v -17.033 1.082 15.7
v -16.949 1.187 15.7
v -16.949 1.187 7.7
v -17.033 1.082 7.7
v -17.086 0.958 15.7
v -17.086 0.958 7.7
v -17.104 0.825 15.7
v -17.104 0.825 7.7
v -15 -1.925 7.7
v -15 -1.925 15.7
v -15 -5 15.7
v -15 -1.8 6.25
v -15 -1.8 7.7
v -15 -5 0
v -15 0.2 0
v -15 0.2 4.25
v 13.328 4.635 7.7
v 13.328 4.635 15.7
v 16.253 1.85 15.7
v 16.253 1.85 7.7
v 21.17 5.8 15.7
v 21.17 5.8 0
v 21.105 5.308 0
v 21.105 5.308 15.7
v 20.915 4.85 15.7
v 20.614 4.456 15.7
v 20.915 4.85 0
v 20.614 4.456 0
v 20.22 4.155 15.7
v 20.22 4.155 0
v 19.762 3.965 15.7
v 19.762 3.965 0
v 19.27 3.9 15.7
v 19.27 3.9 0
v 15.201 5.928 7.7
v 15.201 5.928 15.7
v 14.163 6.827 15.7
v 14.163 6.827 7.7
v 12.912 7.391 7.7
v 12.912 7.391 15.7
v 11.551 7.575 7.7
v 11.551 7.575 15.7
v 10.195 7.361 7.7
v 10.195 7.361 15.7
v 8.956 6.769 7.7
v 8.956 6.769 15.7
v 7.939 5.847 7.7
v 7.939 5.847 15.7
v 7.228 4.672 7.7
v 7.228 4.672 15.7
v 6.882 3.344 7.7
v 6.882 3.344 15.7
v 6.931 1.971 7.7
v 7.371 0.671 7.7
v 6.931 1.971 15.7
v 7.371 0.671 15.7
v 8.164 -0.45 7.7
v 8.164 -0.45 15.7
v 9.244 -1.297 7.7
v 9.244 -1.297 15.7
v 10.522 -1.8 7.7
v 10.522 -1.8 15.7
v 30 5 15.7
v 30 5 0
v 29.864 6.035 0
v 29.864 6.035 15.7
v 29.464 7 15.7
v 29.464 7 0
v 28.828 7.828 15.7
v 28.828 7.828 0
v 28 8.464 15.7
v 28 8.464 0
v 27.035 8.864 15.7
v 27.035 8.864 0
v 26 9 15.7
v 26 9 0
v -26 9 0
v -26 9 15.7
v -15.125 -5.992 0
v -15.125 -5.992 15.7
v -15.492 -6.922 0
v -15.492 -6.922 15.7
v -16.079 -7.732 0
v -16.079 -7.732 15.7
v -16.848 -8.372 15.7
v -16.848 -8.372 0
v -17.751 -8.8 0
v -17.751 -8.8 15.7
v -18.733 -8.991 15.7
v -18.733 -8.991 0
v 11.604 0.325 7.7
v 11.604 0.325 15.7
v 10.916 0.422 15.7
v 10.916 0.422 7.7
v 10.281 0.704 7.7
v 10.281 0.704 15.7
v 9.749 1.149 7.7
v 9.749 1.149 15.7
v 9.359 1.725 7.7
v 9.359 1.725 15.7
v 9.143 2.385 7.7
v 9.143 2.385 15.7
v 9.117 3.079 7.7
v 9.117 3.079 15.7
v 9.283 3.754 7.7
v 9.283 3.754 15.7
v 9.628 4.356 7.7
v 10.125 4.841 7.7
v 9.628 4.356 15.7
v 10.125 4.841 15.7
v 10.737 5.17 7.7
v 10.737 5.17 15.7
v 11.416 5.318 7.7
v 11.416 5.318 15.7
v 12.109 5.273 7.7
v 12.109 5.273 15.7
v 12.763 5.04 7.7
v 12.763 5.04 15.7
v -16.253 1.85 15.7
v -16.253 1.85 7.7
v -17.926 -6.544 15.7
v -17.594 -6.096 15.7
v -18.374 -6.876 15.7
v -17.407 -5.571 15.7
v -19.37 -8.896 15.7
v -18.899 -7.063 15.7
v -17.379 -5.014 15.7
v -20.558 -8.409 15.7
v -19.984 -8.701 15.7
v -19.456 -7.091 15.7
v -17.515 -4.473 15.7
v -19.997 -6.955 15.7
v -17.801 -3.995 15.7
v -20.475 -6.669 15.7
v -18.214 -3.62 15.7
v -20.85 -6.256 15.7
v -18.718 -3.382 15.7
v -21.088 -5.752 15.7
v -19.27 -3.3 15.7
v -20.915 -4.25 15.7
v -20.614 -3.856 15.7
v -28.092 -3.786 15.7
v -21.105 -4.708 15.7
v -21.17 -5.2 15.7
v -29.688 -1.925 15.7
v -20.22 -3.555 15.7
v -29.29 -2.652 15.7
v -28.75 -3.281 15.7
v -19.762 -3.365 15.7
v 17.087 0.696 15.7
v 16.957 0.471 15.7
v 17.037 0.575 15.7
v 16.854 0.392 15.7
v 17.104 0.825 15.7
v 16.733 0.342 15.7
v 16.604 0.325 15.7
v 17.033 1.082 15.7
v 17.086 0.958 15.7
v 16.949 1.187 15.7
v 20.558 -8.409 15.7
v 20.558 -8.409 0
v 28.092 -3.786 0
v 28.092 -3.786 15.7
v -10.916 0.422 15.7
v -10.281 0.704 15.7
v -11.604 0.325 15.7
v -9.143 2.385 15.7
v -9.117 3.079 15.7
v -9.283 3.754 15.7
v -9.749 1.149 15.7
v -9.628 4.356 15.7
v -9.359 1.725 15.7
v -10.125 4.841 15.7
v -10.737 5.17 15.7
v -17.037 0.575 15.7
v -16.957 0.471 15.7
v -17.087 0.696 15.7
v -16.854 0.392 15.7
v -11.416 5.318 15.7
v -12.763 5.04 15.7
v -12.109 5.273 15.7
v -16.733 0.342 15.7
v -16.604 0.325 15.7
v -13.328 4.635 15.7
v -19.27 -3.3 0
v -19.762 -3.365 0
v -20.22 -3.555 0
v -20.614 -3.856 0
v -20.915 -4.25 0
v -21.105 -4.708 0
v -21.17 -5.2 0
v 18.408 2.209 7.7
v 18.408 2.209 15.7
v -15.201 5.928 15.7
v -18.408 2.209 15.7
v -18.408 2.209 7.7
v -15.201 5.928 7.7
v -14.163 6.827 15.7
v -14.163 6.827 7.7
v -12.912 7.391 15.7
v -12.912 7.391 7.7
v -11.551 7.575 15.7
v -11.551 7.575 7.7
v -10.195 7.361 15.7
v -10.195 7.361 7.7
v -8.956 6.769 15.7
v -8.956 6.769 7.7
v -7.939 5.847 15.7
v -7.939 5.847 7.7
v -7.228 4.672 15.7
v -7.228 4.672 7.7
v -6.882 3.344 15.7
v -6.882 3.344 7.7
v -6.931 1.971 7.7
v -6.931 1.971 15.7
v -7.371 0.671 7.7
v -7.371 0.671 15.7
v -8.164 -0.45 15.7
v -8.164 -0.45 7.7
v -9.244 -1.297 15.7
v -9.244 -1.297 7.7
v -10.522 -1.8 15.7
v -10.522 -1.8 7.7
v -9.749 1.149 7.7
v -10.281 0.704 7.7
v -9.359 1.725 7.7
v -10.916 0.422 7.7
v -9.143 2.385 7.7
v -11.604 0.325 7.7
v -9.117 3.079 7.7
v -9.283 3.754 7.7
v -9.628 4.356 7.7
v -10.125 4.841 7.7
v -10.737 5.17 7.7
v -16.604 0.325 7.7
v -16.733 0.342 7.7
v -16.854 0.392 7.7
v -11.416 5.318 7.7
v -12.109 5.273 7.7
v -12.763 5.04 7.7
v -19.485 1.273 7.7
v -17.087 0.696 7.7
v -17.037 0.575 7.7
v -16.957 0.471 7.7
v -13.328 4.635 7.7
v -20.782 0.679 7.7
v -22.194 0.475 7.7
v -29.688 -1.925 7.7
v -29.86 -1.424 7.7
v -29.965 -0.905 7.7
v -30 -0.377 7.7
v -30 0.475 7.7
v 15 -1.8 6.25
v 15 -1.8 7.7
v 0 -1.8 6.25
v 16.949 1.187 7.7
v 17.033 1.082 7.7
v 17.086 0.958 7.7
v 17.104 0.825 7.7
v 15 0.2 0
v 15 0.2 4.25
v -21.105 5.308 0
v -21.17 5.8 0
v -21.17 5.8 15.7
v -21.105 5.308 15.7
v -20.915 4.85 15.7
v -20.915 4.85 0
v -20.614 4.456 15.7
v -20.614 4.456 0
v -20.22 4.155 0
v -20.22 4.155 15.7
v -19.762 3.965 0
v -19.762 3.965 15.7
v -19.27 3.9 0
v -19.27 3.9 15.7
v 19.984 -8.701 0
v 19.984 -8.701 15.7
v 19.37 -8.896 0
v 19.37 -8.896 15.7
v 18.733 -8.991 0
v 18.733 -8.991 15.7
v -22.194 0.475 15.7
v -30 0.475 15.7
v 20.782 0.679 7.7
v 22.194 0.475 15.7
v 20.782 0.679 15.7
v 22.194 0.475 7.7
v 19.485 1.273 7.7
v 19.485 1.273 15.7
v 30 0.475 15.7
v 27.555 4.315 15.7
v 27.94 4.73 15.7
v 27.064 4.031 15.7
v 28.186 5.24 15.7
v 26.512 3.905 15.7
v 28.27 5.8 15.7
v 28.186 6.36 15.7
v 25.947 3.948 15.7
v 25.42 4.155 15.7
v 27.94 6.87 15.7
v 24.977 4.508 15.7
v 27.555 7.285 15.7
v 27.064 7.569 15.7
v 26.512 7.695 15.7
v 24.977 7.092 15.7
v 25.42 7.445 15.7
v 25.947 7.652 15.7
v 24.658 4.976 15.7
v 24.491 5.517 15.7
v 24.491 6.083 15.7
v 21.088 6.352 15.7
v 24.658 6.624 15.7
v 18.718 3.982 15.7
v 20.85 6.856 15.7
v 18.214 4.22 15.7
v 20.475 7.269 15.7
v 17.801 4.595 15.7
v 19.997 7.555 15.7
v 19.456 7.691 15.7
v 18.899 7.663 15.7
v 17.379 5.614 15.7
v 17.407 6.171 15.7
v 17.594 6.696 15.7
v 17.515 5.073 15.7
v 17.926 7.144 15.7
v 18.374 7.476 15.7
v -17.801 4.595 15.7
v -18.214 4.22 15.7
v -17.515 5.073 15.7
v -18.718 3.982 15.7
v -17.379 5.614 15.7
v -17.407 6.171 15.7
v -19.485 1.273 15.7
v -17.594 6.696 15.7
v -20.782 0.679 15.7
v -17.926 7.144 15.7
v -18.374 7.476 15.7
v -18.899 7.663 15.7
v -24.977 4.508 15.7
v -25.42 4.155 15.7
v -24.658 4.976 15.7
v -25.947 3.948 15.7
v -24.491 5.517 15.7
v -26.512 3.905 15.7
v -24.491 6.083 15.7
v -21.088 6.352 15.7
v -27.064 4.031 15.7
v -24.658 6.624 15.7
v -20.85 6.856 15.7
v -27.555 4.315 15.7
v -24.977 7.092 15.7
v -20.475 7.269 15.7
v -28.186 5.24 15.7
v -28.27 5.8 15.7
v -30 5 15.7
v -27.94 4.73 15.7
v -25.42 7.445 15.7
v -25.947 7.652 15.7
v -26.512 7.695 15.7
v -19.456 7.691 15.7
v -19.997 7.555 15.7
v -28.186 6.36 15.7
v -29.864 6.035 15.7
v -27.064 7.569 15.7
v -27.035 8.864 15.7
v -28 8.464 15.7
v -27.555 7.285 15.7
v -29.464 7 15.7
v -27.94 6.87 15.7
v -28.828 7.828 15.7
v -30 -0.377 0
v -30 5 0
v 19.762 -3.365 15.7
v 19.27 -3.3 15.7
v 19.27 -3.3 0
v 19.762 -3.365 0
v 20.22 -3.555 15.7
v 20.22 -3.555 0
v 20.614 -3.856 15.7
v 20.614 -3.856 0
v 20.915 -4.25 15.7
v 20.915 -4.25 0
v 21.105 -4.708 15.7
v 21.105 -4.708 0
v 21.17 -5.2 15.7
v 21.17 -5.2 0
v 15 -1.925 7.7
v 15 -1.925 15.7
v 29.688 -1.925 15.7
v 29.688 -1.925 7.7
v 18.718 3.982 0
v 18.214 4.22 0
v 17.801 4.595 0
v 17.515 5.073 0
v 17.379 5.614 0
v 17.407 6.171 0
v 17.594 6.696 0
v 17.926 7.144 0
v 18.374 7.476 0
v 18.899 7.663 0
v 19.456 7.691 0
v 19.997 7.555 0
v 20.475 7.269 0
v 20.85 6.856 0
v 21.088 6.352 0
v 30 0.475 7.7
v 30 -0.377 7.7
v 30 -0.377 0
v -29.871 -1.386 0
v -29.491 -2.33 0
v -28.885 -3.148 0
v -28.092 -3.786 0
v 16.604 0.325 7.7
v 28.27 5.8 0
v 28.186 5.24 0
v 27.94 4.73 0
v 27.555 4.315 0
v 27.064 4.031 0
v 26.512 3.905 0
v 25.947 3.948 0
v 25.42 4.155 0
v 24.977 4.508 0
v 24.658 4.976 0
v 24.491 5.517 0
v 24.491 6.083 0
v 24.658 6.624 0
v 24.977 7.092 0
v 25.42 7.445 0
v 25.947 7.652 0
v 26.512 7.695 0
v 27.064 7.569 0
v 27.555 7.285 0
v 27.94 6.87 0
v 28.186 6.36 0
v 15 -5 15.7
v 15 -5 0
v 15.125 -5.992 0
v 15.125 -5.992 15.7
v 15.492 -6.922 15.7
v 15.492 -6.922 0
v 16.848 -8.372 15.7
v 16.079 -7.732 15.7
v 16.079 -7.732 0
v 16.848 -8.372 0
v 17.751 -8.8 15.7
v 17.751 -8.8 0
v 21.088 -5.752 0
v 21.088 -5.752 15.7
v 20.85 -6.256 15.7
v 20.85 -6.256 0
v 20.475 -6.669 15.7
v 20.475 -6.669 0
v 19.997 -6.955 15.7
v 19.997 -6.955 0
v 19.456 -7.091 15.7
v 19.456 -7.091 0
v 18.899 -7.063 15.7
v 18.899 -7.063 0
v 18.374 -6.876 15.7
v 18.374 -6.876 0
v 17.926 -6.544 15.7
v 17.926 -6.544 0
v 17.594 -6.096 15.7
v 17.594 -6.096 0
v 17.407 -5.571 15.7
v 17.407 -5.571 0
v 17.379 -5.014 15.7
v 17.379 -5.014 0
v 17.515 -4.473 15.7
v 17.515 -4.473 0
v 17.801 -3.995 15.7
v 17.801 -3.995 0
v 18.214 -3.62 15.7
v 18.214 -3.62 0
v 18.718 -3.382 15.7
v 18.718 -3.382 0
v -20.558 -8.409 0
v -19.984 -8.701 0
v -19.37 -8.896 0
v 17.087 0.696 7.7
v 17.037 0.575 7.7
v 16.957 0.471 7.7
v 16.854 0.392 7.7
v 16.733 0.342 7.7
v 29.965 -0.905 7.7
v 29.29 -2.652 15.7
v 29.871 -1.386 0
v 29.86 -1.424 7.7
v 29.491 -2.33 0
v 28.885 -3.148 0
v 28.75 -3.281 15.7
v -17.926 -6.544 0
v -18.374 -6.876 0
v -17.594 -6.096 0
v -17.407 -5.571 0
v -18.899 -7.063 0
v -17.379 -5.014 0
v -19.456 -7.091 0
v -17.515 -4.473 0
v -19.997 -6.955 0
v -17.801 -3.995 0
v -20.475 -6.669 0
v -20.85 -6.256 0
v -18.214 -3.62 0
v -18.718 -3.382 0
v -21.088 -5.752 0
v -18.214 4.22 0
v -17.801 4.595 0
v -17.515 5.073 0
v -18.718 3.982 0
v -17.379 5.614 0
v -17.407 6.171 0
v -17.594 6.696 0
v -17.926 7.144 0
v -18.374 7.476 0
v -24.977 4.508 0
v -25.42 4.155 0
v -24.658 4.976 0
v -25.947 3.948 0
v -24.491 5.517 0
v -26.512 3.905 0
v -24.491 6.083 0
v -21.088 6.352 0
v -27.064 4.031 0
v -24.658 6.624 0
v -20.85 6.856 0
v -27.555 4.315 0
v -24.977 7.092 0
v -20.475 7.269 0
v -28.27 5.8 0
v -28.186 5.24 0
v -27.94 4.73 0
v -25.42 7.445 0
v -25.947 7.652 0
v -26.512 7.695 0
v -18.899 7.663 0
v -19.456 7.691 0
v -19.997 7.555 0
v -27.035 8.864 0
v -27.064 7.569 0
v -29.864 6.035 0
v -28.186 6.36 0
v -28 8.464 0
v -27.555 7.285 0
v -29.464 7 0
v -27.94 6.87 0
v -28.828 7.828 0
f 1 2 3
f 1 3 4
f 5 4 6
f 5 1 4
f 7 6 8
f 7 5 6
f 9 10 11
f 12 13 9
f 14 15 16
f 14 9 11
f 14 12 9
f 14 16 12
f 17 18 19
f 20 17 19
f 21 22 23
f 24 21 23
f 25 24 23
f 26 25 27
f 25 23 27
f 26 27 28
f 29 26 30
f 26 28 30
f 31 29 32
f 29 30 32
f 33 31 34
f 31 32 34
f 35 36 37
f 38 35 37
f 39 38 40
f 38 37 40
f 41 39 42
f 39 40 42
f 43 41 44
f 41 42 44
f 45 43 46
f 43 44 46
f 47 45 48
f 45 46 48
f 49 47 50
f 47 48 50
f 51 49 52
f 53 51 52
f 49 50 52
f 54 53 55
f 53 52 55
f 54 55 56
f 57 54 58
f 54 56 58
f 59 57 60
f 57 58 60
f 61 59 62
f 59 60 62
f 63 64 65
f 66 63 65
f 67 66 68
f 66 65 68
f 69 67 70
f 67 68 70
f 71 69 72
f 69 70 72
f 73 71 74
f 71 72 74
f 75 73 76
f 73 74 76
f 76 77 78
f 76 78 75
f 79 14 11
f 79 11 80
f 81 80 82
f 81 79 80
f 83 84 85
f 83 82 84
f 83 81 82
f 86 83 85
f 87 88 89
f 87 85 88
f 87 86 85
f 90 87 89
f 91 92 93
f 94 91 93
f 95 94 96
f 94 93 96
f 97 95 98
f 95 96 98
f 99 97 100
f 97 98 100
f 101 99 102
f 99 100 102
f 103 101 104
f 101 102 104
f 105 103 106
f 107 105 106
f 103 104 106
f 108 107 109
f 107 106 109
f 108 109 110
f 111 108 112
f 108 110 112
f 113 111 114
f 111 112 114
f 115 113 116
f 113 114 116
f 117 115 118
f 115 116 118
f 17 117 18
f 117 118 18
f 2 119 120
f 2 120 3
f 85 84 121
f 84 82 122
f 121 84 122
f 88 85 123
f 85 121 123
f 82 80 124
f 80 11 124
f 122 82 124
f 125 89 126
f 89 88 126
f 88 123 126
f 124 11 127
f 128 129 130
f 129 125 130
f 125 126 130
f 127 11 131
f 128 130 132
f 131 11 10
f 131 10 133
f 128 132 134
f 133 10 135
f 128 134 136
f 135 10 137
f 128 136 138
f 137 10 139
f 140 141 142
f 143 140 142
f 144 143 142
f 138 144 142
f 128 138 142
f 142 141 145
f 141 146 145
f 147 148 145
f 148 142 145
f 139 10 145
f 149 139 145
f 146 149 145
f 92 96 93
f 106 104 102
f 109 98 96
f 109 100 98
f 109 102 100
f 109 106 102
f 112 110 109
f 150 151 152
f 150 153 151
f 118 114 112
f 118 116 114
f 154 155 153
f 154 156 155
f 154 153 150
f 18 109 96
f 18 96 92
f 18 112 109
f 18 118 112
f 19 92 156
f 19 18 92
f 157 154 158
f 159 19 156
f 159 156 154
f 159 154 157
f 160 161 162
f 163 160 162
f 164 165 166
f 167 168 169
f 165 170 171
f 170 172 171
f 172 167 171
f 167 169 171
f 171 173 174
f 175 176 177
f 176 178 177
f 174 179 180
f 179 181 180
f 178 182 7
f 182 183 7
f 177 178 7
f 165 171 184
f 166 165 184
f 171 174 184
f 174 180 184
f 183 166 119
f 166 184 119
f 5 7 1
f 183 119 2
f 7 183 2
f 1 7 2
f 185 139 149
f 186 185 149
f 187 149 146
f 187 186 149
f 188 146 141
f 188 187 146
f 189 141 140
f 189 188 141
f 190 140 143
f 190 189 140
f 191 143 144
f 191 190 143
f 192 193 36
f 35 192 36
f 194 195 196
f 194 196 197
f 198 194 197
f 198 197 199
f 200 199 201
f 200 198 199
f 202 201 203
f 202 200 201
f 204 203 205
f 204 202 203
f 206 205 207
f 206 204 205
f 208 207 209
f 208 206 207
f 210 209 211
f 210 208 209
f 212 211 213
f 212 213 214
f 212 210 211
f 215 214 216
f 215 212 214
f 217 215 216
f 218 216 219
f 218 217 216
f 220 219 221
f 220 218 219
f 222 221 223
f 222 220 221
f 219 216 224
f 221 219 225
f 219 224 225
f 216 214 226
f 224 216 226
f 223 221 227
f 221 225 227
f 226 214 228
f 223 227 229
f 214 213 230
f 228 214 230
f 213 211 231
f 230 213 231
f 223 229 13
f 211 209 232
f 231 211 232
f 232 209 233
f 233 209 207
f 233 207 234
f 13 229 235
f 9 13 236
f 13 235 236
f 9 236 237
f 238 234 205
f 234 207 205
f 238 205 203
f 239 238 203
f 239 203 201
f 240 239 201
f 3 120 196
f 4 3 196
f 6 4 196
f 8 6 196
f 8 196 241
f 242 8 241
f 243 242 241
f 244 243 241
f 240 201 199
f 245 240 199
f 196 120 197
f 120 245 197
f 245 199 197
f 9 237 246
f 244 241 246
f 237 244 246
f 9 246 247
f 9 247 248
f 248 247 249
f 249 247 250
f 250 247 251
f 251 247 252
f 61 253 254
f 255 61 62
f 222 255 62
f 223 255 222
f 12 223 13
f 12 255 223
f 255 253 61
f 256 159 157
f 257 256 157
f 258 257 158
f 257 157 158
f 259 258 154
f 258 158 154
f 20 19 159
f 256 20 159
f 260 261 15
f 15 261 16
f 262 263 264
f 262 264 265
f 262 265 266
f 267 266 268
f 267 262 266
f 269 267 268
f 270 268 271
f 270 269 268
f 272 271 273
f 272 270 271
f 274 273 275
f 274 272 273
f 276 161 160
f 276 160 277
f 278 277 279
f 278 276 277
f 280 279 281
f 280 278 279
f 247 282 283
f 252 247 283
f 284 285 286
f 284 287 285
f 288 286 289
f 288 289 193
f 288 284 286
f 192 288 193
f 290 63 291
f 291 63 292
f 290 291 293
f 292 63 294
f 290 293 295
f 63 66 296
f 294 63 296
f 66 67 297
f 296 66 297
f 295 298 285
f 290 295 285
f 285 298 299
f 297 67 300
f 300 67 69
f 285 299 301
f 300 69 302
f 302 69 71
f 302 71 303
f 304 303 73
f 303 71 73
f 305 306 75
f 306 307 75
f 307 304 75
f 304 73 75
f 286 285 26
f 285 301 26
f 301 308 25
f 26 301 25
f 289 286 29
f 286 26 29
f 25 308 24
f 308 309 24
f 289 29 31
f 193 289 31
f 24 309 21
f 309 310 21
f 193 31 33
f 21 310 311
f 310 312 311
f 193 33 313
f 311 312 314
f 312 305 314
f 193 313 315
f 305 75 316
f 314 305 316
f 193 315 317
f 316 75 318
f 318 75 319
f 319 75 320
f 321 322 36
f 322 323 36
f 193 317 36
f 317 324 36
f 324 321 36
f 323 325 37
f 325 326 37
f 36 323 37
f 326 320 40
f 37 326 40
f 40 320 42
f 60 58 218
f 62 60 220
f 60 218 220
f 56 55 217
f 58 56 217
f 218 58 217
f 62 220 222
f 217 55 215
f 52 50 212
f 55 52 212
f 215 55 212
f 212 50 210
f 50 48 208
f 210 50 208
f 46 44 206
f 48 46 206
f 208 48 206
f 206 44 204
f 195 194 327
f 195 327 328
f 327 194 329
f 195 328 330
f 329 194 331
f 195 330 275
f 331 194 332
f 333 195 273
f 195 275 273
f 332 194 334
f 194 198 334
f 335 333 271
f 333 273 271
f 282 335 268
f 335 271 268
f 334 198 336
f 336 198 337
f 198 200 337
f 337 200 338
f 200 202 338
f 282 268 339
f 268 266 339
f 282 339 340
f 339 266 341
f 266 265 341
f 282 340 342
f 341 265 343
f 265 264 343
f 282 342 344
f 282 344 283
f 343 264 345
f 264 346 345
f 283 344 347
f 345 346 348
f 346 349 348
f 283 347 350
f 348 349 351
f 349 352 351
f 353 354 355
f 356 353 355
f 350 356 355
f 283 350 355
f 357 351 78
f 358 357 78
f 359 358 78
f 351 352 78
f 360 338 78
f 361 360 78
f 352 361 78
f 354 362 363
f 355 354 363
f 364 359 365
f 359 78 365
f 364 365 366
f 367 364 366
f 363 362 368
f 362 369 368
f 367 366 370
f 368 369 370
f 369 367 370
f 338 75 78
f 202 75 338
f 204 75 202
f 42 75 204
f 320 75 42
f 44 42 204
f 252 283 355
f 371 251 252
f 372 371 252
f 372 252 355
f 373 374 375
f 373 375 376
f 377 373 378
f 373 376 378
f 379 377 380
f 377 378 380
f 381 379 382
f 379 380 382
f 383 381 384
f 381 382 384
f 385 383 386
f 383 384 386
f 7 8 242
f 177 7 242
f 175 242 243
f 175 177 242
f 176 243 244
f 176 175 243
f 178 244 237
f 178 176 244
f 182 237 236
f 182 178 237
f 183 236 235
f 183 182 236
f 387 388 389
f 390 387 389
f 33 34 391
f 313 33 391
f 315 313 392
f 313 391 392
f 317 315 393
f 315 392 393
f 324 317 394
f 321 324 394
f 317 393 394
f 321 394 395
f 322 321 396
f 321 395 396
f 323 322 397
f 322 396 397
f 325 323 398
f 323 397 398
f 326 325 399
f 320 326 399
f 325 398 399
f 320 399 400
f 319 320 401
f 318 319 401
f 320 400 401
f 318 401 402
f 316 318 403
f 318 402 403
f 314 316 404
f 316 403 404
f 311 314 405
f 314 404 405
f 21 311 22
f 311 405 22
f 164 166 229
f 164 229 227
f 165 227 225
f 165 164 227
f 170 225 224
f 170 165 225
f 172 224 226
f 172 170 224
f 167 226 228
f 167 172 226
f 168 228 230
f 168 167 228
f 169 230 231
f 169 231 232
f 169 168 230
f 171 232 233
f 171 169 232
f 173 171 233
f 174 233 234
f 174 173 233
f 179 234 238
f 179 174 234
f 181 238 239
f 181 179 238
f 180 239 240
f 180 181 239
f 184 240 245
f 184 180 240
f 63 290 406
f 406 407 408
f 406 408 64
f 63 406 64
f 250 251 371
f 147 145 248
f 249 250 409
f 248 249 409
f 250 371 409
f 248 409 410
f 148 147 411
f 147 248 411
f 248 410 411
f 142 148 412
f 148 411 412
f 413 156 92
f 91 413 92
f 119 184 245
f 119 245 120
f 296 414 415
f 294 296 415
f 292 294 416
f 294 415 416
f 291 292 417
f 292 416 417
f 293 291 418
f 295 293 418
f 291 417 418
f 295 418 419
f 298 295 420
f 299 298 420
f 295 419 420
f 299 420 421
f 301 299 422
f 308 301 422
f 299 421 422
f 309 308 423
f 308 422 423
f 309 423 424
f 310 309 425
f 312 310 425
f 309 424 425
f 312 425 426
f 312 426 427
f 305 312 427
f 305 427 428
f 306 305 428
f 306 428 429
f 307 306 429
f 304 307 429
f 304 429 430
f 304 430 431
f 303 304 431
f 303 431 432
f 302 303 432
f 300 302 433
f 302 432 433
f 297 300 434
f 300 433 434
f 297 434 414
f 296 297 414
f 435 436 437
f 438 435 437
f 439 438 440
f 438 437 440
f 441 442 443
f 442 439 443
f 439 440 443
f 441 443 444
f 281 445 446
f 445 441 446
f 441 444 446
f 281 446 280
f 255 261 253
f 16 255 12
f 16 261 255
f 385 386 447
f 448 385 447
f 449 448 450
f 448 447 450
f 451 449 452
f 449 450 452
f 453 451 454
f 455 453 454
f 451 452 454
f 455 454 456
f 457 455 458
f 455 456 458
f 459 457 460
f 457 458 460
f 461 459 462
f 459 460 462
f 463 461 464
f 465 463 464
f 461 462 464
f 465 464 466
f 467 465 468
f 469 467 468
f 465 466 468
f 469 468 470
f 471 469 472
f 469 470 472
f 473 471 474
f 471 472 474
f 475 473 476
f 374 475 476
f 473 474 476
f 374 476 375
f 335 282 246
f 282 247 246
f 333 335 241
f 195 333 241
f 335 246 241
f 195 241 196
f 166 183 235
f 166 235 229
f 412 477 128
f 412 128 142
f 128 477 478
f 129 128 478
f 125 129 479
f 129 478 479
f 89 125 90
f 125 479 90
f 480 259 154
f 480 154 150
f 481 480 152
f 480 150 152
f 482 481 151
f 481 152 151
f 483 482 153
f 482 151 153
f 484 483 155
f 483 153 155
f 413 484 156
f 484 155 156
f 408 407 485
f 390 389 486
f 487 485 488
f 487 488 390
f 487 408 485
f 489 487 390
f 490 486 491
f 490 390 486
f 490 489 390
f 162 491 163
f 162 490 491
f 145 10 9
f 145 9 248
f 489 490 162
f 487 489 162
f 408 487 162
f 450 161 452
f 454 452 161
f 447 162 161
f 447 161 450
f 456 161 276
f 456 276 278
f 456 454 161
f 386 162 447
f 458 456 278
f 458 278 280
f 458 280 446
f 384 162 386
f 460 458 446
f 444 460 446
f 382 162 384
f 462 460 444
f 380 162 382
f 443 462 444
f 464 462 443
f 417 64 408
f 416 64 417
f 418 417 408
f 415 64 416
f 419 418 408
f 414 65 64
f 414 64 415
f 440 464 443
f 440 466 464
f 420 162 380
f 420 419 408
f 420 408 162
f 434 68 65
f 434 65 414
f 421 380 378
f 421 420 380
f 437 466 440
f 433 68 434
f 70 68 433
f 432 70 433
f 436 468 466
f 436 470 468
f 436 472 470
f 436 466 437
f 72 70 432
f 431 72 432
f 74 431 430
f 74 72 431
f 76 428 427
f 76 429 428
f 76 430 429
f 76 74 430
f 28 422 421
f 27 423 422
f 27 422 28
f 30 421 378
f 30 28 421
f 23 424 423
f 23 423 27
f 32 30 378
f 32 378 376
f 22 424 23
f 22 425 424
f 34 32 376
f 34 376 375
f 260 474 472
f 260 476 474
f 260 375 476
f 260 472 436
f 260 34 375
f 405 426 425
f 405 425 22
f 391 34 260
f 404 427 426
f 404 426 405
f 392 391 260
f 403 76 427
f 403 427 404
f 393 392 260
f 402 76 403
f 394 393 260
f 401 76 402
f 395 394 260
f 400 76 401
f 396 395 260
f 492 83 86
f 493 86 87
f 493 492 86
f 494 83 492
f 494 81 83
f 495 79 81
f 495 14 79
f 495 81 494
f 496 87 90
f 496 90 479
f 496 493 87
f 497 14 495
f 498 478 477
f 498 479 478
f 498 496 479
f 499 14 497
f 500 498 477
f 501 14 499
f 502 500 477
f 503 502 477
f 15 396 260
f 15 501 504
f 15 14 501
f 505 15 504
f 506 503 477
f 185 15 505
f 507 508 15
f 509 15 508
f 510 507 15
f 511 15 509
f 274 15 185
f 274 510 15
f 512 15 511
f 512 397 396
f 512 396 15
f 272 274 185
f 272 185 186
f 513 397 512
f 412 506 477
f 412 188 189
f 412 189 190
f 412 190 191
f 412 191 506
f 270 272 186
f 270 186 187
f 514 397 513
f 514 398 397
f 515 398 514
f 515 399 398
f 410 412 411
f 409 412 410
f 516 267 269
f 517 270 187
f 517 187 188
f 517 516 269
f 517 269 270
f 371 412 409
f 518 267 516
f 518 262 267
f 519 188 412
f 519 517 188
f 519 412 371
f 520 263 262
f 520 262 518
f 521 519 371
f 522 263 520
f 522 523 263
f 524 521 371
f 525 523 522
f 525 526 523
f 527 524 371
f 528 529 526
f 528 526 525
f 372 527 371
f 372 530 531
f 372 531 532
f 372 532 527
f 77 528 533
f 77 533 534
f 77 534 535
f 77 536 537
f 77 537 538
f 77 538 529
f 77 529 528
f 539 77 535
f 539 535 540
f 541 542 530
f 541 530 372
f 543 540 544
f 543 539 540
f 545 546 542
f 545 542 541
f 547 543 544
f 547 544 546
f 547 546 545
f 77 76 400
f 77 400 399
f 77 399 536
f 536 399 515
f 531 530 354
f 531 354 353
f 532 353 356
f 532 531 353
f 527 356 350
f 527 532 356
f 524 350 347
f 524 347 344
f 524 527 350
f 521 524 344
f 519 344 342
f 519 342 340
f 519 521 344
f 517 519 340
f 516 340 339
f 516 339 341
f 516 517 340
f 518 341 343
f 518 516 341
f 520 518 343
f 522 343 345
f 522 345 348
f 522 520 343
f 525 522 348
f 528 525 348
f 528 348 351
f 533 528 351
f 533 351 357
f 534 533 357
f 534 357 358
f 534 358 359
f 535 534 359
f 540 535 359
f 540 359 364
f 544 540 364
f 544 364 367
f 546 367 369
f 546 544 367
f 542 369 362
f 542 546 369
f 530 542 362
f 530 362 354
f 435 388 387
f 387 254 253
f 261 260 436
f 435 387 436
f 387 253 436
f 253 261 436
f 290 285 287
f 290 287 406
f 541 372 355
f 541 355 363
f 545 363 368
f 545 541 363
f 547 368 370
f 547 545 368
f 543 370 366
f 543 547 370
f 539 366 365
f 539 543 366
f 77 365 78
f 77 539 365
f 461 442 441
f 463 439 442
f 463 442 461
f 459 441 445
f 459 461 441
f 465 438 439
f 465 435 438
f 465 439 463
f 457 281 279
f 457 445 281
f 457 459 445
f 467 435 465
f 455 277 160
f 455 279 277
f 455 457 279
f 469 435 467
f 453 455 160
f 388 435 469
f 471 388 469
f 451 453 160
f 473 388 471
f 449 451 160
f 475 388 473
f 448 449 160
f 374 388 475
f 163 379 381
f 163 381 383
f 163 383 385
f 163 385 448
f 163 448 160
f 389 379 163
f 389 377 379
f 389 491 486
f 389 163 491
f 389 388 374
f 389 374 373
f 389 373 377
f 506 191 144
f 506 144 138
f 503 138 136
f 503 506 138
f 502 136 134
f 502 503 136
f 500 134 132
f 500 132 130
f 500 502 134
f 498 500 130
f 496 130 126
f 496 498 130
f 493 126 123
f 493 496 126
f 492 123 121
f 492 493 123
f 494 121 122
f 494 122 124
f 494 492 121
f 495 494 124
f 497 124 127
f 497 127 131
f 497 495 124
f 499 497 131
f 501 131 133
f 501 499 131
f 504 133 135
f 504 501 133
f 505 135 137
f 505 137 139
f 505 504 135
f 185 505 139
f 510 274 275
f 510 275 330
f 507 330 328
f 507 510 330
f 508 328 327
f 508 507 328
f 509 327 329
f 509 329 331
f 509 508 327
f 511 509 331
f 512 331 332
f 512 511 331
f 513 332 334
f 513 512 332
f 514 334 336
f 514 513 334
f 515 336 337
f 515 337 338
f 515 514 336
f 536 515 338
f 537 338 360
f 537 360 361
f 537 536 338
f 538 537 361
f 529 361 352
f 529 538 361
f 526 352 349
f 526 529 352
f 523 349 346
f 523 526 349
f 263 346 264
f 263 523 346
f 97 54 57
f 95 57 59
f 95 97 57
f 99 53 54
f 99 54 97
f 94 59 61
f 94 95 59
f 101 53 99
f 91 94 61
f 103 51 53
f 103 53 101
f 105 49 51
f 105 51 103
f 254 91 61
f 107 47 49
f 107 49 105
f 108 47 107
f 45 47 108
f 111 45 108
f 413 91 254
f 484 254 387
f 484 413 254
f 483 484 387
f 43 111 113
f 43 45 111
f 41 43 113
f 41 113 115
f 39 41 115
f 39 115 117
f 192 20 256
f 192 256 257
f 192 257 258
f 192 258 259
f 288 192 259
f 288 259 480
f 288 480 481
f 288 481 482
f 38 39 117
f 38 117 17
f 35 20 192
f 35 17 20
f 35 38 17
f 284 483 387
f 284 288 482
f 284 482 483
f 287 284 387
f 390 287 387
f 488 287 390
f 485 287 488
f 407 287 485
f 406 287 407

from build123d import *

# Parameters (mm, degrees)
F1_DEPTH    = 15.7
F2_W        = 10.0960650777
F2_H        = 2.4
F3_DEPTH    = 8
F4_R        = 5
F5_T1_DEPTH = 26.8923143391
F5_T3_DEPTH = 21.3473434867
F5_T5_DEPTH = 35.7
F6_W        = 15
F6_H        = 6.25
F7_DEPTH    = 2
F8_SIZE     = 1.99999


# Not quite as in the source:
# - a fillet or chamfer that OpenCascade refuses, or shapes differently, is made with other operations: its cross-section is extruded or revolved along the edge and cut away or added
# - a fillet or chamfer is up to 0.001 mm smaller than in the source, because OpenCascade refuses the exact size


with BuildPart() as f1:
    # F0 (on Top) → F1 (new body)
    with BuildSketch(Plane.XY):
        Polygon((30, 9), (0, 9), (0, -1.8), (15, -1.8), (15, -9), (19.5954625243, -9), (30, -2.6151265483), align=None)
        with BuildLine():
            ThreePointArc((21.17, -5.2), (17.9264971157, -6.5435028843), (19.27, -3.3))
            ThreePointArc((19.27, -3.3), (20.6135028843, -3.8564971157), (21.17, -5.2))
        make_face(mode=Mode.SUBTRACT)
        with BuildLine():
            ThreePointArc((19.27, 3.9), (17.9264971157, 7.1435028843), (21.17, 5.8))
            ThreePointArc((21.17, 5.8), (20.6135028843, 4.4564971157), (19.27, 3.9))
        make_face(mode=Mode.SUBTRACT)
        with BuildLine():
            ThreePointArc((24.47, 5.8), (26.37, 7.7), (28.27, 5.8))
            ThreePointArc((28.27, 5.8), (26.37, 3.9), (24.47, 5.8))
        make_face(mode=Mode.SUBTRACT)
    extrude(amount=F1_DEPTH)

    # F2 (on face) → F3 (cut)
    with BuildSketch(Plane.XY.offset(15.7)):
        with BuildLine():
            ThreePointArc((11.6039349223, 0.3250306588), (9.2827431951, 3.7535073497), (13.3280728534, 4.6353754864))
            Line((13.3280728534, 4.6353754864), (16.2527744297, 1.8499454137))
            ThreePointArc((16.2527744297, 1.8499454137), (16.328577113, 2.3348713274), (16.3539349223, 2.8250306588))
            ThreePointArc((16.3539349223, 2.8250306588), (16.0563093355, 4.479981439), (15.200729834, 5.9275403467))
            ThreePointArc((15.200729834, 5.9275403467), (7.5407755063, 5.2853630672), (10.5215341623, -1.8))
            Line((10.5215341623, -1.8), (12.6863356823, -1.8))
            ThreePointArc((12.6863356823, -1.8), (14.376262754, -1.0320016711), (15.6428085277, 0.3250306588))
            Line((15.6428085277, 0.3250306588), (11.6039349223, 0.3250306588))
        make_face()
        with BuildLine():
            ThreePointArc((16.3539349223, 2.8250306588), (16.328577113, 2.3348713274), (16.2527744297, 1.8499454137))
            Line((16.2527744297, 1.8499454137), (16.9487625085, 1.1870996243))
            ThreePointArc((16.9487625085, 1.1870996243), (17.0635074373, 1.0219903081), (17.1039349223, 0.8250306588))
            ThreePointArc((17.1039349223, 0.8250306588), (16.9574883129, 0.4714772682), (16.6039349223, 0.3250306588))
            Line((16.6039349223, 0.3250306588), (15.6428085277, 0.3250306588))
            ThreePointArc((15.6428085277, 0.3250306588), (14.376262754, -1.0320016711), (12.6863356823, -1.8))
            Line((12.6863356823, -1.8), (15, -1.8))
            Line((15, -1.8), (15, -1.9249693412))
            Line((15, -1.9249693412), (19.9039349223, -1.9249693412))
            Line((19.9039349223, -1.9249693412), (19.9039349223, 0.4750306588))
            Line((19.9039349223, 0.4750306588), (15.200729834, 5.9275403467))
            ThreePointArc((15.200729834, 5.9275403467), (16.0563093355, 4.479981439), (16.3539349223, 2.8250306588))
        make_face()
        with Locations((24.9519674612, -0.7249693412)):
            Rectangle(F2_W, F2_H)
    extrude(amount=-F3_DEPTH, mode=Mode.SUBTRACT)

    # F4
    f4_edges = [f1.edges().sort_by_distance(p)[0] for p in [
        (19.903935, 0.475031, 11.7),
    ]]
    fillet(f4_edges, radius=F4_R)

    # F5: fillet of radius 4 on 4 edges, made by hand

    # F5_s2 → F5_t1 (cut)
    with BuildSketch(Plane.XY.offset(-5.5961571696)):
        with BuildLine():
            ThreePointArc((30, -0.3766636805), (29.4905957559, -2.3300559271), (28.0921293656, -3.7859150232))
            Line((28.0921293656, -3.7859150232), (30, -2.6151265483))
            Line((30, -2.6151265483), (30, -0.3766636805))
        make_face()
    extrude(amount=F5_T1_DEPTH, mode=Mode.SUBTRACT)

    # F5_s4 → F5_t3 (cut)
    with BuildSketch(Plane.XY.offset(-2.8236717433)):
        with BuildLine():
            ThreePointArc((20.5581231925, -8.4092513427), (19.5529608525, -8.8494808332), (18.465993827, -9))
            Line((18.465993827, -9), (19.5954625243, -9))
            Line((19.5954625243, -9), (20.5581231925, -8.4092513427))
        make_face()
    extrude(amount=F5_T3_DEPTH, mode=Mode.SUBTRACT)

    # F5_s6 → F5_t5 (cut)
    with BuildSketch(Plane.XY.offset(-10)):
        with BuildLine():
            ThreePointArc((15, -5), (16.1715728753, -7.8284271247), (19, -9))
            Line((19, -9), (15, -9))
            Line((15, -9), (15, -5))
        make_face()
        with BuildLine():
            ThreePointArc((30, 5), (28.8284271247, 7.8284271247), (26, 9))
            Line((26, 9), (30, 9))
            Line((30, 9), (30, 5))
        make_face()
    extrude(amount=F5_T5_DEPTH, mode=Mode.SUBTRACT)

    # F6 (on face) → F7 (cut)
    with BuildSketch(Plane.XZ.offset(1.8)):
        with Locations((7.5, 3.125)):
            Rectangle(F6_W, F6_H)
    extrude(amount=-F7_DEPTH, mode=Mode.SUBTRACT)

    # F8 (size 2 in the source; OpenCascade refuses exactly that, so slightly less here)
    f8_edges = [f1.edges().sort_by_distance(p)[0] for p in [
        (7.5, 0.2, 6.25),
    ]]
    chamfer(f8_edges, length=F8_SIZE)

    # F9: F1 across plane


with BuildPart() as f1_1:
    add(f1.part)
    add(f1.part.mirror(Plane.YZ))


solid = f1_1.part
